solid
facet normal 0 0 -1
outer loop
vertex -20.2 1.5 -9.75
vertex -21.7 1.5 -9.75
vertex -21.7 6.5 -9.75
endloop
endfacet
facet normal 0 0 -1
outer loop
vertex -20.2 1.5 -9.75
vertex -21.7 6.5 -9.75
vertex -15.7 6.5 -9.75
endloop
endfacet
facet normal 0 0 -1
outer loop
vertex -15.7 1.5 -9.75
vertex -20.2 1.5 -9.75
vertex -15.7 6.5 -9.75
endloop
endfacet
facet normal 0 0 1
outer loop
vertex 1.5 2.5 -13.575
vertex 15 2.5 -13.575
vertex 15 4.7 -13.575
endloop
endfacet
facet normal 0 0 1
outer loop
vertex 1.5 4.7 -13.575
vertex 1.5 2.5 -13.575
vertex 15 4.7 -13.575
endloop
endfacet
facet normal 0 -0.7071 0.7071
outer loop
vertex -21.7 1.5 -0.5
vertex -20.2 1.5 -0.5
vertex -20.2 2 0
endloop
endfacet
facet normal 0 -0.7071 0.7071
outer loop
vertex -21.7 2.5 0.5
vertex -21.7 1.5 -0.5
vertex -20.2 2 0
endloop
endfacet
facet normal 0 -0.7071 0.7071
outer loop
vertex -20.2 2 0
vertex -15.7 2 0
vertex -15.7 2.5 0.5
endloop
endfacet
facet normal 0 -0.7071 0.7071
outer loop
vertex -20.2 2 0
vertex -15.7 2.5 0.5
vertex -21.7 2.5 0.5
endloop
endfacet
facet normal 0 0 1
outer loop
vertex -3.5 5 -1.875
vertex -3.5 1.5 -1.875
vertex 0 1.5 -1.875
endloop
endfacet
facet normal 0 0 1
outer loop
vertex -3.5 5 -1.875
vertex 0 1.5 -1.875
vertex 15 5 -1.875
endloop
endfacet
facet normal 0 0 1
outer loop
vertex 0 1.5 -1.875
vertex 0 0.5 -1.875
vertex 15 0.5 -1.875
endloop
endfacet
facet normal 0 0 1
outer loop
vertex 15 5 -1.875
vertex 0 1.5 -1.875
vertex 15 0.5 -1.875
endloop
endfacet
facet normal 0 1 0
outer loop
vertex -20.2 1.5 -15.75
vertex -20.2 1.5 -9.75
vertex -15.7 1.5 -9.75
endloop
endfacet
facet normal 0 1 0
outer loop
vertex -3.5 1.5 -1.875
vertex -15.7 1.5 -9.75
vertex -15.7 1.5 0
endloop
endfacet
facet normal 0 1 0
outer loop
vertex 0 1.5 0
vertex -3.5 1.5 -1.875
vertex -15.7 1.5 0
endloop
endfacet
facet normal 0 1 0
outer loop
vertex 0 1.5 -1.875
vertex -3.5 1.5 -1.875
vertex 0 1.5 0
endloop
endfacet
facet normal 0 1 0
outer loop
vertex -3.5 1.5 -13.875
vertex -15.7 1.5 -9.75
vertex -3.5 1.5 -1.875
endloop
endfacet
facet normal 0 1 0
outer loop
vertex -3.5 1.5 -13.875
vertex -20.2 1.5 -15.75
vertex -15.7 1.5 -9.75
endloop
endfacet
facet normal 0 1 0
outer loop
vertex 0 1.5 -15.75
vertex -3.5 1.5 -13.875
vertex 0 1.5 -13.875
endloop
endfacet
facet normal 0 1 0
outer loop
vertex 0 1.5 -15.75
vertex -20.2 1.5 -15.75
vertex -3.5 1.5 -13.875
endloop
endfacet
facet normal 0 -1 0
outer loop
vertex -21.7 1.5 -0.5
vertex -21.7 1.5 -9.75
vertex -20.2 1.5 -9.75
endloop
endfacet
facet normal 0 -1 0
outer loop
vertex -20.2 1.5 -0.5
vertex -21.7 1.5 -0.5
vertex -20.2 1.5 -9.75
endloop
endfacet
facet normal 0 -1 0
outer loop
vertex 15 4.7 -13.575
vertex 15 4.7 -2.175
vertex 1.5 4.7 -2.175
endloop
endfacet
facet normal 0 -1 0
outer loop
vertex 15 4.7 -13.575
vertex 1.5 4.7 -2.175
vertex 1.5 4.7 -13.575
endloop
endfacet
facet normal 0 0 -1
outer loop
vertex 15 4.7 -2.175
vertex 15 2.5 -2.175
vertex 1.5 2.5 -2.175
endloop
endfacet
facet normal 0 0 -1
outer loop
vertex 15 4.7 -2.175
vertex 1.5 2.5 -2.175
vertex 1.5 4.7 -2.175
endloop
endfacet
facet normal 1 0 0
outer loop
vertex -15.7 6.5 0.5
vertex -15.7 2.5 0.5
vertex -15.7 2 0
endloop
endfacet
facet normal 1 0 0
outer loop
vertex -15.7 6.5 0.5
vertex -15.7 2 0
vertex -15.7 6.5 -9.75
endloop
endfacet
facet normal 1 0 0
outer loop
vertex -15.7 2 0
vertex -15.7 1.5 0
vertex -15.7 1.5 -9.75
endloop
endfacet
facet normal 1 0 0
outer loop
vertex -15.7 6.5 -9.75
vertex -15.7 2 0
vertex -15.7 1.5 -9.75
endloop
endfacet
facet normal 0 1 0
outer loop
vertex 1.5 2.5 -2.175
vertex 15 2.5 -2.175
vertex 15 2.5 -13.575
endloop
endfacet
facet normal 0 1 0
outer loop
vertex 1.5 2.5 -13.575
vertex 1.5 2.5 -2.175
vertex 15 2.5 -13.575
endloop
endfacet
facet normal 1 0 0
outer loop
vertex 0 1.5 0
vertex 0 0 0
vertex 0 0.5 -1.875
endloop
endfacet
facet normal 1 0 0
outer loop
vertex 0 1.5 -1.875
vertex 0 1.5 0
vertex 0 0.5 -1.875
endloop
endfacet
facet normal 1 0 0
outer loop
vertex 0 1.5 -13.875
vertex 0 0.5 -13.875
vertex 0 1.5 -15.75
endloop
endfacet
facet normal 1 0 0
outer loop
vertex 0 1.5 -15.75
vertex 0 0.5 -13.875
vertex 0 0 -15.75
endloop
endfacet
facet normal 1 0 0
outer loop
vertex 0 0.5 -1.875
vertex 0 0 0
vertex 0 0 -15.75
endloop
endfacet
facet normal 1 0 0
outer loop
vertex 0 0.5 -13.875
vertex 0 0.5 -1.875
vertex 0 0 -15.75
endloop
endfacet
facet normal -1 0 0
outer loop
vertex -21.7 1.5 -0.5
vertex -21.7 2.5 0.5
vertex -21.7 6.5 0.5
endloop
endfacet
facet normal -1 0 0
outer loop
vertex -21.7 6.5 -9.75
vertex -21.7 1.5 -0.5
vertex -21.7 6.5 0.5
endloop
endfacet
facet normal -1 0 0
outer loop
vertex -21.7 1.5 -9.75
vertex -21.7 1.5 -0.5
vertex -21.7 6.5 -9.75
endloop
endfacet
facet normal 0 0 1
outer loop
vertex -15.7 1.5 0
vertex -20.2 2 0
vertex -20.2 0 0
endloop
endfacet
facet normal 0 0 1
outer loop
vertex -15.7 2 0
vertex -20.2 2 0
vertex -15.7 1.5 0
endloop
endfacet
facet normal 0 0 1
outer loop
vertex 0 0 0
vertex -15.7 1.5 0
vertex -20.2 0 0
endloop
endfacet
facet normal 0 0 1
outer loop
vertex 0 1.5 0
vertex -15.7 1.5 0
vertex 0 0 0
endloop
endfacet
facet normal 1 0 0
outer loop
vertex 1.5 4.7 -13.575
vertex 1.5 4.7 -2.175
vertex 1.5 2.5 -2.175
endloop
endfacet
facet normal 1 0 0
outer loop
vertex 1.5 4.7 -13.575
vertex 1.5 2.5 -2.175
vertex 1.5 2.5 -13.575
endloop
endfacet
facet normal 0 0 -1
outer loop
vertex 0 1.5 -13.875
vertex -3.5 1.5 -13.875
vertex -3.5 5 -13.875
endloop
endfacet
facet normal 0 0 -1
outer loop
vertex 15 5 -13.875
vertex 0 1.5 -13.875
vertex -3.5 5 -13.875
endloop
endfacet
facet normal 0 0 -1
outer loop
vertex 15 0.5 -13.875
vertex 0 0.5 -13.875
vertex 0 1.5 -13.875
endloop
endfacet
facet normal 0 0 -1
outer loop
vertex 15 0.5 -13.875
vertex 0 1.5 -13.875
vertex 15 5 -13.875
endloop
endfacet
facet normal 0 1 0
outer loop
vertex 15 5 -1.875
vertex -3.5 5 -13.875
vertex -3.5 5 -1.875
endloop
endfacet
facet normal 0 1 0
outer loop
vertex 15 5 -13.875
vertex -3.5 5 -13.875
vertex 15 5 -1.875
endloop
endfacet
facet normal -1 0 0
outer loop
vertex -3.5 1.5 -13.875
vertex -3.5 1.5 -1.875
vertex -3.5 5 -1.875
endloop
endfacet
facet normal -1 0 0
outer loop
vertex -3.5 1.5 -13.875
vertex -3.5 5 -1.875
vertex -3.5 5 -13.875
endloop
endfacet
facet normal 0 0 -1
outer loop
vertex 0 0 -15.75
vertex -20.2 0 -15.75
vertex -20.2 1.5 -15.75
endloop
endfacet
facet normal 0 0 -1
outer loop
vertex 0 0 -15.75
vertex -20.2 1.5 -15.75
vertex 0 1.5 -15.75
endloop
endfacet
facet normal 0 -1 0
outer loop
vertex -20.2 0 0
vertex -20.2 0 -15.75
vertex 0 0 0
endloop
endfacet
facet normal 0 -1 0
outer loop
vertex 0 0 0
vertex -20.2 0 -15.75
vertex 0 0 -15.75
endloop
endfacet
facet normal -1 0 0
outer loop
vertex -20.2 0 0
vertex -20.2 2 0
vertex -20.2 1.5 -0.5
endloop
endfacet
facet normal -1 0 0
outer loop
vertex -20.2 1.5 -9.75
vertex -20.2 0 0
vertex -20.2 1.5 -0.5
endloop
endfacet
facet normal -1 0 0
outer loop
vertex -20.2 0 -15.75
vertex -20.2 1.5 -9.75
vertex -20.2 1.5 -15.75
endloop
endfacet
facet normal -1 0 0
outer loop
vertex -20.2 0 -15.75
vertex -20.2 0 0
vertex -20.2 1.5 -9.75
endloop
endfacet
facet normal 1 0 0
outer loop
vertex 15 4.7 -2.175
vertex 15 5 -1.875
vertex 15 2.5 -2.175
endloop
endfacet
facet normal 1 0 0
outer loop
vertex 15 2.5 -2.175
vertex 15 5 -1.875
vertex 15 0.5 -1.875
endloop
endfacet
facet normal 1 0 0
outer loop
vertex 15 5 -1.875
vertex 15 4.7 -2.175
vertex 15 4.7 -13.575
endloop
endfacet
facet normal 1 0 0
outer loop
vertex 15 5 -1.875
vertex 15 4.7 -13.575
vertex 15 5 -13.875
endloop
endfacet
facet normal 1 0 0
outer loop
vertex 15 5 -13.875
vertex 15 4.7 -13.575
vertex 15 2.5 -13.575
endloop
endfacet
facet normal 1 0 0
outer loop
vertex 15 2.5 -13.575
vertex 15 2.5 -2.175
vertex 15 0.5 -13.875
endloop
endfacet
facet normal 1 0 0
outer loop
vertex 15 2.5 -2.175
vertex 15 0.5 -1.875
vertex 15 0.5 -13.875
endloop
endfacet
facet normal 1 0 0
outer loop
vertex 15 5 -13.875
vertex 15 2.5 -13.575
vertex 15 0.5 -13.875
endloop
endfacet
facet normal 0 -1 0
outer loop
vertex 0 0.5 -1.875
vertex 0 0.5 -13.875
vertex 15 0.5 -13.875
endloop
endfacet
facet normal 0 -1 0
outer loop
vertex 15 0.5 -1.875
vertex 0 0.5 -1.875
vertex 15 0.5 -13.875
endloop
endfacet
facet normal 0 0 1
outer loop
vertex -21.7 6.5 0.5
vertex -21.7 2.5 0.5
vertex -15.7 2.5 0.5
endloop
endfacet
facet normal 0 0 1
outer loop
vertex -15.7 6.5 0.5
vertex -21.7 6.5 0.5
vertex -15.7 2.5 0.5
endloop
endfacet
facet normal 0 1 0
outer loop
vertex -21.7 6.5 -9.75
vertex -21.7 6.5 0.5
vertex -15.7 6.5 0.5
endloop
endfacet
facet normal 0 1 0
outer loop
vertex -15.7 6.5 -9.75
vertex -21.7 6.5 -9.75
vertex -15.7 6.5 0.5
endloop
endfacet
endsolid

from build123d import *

# Parameters (mm, degrees)
ESQUISSE1_W             = 20.2
ESQUISSE1_H             = 15.75
BOSS_EXTRU_1_DEPTH      = 1.5
BOSS_EXTRU_2_DEPTH      = 3.5
BOSS_EXTRU_2_DEPTH_BACK = 1
ESQUISSE2_W             = 18.5
ESQUISSE2_H             = 12
ESQUISSE3_W             = 11.4
ESQUISSE3_H             = 2.2
ENL_V_MAT_EXTRU_1_DEPTH = 13.5
ESQUISSE4_W             = 6
ESQUISSE4_H             = 10.25
BOSS_EXTRU_4_DEPTH      = 5
CHANFREIN1_SIZE         = 1


with BuildPart() as part:
    # Esquisse1 → Boss.-Extru.1 (new body)
    with BuildSketch(Plane(origin=(0, 0, 0), x_dir=(1, 0, 0), z_dir=(0, 1, 0))):
        with Locations((-10.1, 7.875)):
            Rectangle(ESQUISSE1_W, ESQUISSE1_H)
    extrude(amount=BOSS_EXTRU_1_DEPTH)

    # Esquisse2 → Boss.-Extru.2 (add, two sides: drawn at the far end of the back side and taken through both)
    with BuildSketch(Plane(origin=(0, 1.5, 0), x_dir=(1, 0, 0), z_dir=(0, 1, 0)).offset(-BOSS_EXTRU_2_DEPTH_BACK)):
        with Locations((5.75, 7.875)):
            Rectangle(ESQUISSE2_W, ESQUISSE2_H)
    extrude(amount=BOSS_EXTRU_2_DEPTH + BOSS_EXTRU_2_DEPTH_BACK)

    # Esquisse3 → Enlèv. mat.-Extru.1 (cut)
    with BuildSketch(Plane(origin=(15, 0, 0), x_dir=(0, 0, -1), z_dir=(1, 0, 0))):
        with Locations((7.875, 3.6)):
            Rectangle(ESQUISSE3_W, ESQUISSE3_H)
    extrude(amount=-ENL_V_MAT_EXTRU_1_DEPTH, mode=Mode.SUBTRACT)

    # Esquisse4 → Boss.-Extru.4 (add)
    with BuildSketch(Plane(origin=(0, 1.5, 0), x_dir=(1, 0, 0), z_dir=(0, 1, 0))):
        with Locations((-18.7, 4.625)):
            Rectangle(ESQUISSE4_W, ESQUISSE4_H)
    extrude(amount=BOSS_EXTRU_4_DEPTH)

    # Chanfrein1
    # the kernel refuses this chamfer: 1 mm, written as the material it takes off along each edge
    with BuildSketch(Plane(origin=(-13.128317012, 1.5, 0.5), x_dir=(0, -0.02749587661058627, -0.9996219169112968), z_dir=(-1, 0, 0))) as chanfrein1_piece_1_section:
        Polygon((CHANFREIN1_SIZE * 0.999621916911, -CHANFREIN1_SIZE * 0.0274958766106), (-CHANFREIN1_SIZE * 0.0274958766106, -CHANFREIN1_SIZE * 0.999621916911), (0, 0), align=None)
    chanfrein1_piece_1 = extrude(amount=11.143365976, mode=Mode.PRIVATE)
    chanfrein1_piece_1 = split(chanfrein1_piece_1, bisect_by=Plane(origin=(-16.664158506, 1.893401084, 0), z_dir=(0, 0, 1)), keep=Keep.TOP, mode=Mode.PRIVATE)
    chanfrein1_piece_1 = split(chanfrein1_piece_1, bisect_by=Plane(origin=(-20.2, 1.893401084, 0.29176571), z_dir=(1, 0, 0)), keep=Keep.TOP, mode=Mode.PRIVATE)
    add(chanfrein1_piece_1, mode=Mode.SUBTRACT)
    with BuildSketch(Plane(origin=(-13.128317012, 1.5, 0.5), x_dir=(0, -0.02749587661058627, -0.9996219169112968), z_dir=(-1, 0, 0))) as chanfrein1_piece_2_section:
        Polygon((CHANFREIN1_SIZE * 0.999621916911, -CHANFREIN1_SIZE * 0.0274958766106), (-CHANFREIN1_SIZE * 0.0274958766106, -CHANFREIN1_SIZE * 0.999621916911), (0, 0), align=None)
    chanfrein1_piece_2 = extrude(amount=11.143365976, mode=Mode.PRIVATE)
    chanfrein1_piece_2 = split(chanfrein1_piece_2, bisect_by=Plane(origin=(-22.235841494, 1.645570657, 0), z_dir=(0, 0, -1)), keep=Keep.TOP, mode=Mode.PRIVATE)
    chanfrein1_piece_2 = split(chanfrein1_piece_2, bisect_by=Plane(origin=(-20.2, 1.645570657, -0.181859612), z_dir=(-1, 0, 0)), keep=Keep.TOP, mode=Mode.PRIVATE)
    add(chanfrein1_piece_2, mode=Mode.SUBTRACT)
    with BuildSketch(Plane(origin=(-13.128317012, 1.5, 0.5), x_dir=(0, -0.02749587661058627, -0.9996219169112968), z_dir=(-1, 0, 0))) as chanfrein1_piece_3_section:
        Polygon((CHANFREIN1_SIZE * 0.999621916911, -CHANFREIN1_SIZE * 0.0274958766106), (-CHANFREIN1_SIZE * 0.0274958766106, -CHANFREIN1_SIZE * 0.999621916911), (0, 0), align=None)
    chanfrein1_piece_3 = extrude(amount=11.143365976, mode=Mode.PRIVATE)
    chanfrein1_piece_3 = split(chanfrein1_piece_3, bisect_by=Plane(origin=(-22.235841494, 1.893401084, 0), z_dir=(0, 0, 1)), keep=Keep.TOP, mode=Mode.PRIVATE)
    chanfrein1_piece_3 = split(chanfrein1_piece_3, bisect_by=Plane(origin=(-20.2, 1.893401084, 0.29176571), z_dir=(-1, 0, 0)), keep=Keep.TOP, mode=Mode.PRIVATE)
    add(chanfrein1_piece_3, mode=Mode.SUBTRACT)


solid = part.part
